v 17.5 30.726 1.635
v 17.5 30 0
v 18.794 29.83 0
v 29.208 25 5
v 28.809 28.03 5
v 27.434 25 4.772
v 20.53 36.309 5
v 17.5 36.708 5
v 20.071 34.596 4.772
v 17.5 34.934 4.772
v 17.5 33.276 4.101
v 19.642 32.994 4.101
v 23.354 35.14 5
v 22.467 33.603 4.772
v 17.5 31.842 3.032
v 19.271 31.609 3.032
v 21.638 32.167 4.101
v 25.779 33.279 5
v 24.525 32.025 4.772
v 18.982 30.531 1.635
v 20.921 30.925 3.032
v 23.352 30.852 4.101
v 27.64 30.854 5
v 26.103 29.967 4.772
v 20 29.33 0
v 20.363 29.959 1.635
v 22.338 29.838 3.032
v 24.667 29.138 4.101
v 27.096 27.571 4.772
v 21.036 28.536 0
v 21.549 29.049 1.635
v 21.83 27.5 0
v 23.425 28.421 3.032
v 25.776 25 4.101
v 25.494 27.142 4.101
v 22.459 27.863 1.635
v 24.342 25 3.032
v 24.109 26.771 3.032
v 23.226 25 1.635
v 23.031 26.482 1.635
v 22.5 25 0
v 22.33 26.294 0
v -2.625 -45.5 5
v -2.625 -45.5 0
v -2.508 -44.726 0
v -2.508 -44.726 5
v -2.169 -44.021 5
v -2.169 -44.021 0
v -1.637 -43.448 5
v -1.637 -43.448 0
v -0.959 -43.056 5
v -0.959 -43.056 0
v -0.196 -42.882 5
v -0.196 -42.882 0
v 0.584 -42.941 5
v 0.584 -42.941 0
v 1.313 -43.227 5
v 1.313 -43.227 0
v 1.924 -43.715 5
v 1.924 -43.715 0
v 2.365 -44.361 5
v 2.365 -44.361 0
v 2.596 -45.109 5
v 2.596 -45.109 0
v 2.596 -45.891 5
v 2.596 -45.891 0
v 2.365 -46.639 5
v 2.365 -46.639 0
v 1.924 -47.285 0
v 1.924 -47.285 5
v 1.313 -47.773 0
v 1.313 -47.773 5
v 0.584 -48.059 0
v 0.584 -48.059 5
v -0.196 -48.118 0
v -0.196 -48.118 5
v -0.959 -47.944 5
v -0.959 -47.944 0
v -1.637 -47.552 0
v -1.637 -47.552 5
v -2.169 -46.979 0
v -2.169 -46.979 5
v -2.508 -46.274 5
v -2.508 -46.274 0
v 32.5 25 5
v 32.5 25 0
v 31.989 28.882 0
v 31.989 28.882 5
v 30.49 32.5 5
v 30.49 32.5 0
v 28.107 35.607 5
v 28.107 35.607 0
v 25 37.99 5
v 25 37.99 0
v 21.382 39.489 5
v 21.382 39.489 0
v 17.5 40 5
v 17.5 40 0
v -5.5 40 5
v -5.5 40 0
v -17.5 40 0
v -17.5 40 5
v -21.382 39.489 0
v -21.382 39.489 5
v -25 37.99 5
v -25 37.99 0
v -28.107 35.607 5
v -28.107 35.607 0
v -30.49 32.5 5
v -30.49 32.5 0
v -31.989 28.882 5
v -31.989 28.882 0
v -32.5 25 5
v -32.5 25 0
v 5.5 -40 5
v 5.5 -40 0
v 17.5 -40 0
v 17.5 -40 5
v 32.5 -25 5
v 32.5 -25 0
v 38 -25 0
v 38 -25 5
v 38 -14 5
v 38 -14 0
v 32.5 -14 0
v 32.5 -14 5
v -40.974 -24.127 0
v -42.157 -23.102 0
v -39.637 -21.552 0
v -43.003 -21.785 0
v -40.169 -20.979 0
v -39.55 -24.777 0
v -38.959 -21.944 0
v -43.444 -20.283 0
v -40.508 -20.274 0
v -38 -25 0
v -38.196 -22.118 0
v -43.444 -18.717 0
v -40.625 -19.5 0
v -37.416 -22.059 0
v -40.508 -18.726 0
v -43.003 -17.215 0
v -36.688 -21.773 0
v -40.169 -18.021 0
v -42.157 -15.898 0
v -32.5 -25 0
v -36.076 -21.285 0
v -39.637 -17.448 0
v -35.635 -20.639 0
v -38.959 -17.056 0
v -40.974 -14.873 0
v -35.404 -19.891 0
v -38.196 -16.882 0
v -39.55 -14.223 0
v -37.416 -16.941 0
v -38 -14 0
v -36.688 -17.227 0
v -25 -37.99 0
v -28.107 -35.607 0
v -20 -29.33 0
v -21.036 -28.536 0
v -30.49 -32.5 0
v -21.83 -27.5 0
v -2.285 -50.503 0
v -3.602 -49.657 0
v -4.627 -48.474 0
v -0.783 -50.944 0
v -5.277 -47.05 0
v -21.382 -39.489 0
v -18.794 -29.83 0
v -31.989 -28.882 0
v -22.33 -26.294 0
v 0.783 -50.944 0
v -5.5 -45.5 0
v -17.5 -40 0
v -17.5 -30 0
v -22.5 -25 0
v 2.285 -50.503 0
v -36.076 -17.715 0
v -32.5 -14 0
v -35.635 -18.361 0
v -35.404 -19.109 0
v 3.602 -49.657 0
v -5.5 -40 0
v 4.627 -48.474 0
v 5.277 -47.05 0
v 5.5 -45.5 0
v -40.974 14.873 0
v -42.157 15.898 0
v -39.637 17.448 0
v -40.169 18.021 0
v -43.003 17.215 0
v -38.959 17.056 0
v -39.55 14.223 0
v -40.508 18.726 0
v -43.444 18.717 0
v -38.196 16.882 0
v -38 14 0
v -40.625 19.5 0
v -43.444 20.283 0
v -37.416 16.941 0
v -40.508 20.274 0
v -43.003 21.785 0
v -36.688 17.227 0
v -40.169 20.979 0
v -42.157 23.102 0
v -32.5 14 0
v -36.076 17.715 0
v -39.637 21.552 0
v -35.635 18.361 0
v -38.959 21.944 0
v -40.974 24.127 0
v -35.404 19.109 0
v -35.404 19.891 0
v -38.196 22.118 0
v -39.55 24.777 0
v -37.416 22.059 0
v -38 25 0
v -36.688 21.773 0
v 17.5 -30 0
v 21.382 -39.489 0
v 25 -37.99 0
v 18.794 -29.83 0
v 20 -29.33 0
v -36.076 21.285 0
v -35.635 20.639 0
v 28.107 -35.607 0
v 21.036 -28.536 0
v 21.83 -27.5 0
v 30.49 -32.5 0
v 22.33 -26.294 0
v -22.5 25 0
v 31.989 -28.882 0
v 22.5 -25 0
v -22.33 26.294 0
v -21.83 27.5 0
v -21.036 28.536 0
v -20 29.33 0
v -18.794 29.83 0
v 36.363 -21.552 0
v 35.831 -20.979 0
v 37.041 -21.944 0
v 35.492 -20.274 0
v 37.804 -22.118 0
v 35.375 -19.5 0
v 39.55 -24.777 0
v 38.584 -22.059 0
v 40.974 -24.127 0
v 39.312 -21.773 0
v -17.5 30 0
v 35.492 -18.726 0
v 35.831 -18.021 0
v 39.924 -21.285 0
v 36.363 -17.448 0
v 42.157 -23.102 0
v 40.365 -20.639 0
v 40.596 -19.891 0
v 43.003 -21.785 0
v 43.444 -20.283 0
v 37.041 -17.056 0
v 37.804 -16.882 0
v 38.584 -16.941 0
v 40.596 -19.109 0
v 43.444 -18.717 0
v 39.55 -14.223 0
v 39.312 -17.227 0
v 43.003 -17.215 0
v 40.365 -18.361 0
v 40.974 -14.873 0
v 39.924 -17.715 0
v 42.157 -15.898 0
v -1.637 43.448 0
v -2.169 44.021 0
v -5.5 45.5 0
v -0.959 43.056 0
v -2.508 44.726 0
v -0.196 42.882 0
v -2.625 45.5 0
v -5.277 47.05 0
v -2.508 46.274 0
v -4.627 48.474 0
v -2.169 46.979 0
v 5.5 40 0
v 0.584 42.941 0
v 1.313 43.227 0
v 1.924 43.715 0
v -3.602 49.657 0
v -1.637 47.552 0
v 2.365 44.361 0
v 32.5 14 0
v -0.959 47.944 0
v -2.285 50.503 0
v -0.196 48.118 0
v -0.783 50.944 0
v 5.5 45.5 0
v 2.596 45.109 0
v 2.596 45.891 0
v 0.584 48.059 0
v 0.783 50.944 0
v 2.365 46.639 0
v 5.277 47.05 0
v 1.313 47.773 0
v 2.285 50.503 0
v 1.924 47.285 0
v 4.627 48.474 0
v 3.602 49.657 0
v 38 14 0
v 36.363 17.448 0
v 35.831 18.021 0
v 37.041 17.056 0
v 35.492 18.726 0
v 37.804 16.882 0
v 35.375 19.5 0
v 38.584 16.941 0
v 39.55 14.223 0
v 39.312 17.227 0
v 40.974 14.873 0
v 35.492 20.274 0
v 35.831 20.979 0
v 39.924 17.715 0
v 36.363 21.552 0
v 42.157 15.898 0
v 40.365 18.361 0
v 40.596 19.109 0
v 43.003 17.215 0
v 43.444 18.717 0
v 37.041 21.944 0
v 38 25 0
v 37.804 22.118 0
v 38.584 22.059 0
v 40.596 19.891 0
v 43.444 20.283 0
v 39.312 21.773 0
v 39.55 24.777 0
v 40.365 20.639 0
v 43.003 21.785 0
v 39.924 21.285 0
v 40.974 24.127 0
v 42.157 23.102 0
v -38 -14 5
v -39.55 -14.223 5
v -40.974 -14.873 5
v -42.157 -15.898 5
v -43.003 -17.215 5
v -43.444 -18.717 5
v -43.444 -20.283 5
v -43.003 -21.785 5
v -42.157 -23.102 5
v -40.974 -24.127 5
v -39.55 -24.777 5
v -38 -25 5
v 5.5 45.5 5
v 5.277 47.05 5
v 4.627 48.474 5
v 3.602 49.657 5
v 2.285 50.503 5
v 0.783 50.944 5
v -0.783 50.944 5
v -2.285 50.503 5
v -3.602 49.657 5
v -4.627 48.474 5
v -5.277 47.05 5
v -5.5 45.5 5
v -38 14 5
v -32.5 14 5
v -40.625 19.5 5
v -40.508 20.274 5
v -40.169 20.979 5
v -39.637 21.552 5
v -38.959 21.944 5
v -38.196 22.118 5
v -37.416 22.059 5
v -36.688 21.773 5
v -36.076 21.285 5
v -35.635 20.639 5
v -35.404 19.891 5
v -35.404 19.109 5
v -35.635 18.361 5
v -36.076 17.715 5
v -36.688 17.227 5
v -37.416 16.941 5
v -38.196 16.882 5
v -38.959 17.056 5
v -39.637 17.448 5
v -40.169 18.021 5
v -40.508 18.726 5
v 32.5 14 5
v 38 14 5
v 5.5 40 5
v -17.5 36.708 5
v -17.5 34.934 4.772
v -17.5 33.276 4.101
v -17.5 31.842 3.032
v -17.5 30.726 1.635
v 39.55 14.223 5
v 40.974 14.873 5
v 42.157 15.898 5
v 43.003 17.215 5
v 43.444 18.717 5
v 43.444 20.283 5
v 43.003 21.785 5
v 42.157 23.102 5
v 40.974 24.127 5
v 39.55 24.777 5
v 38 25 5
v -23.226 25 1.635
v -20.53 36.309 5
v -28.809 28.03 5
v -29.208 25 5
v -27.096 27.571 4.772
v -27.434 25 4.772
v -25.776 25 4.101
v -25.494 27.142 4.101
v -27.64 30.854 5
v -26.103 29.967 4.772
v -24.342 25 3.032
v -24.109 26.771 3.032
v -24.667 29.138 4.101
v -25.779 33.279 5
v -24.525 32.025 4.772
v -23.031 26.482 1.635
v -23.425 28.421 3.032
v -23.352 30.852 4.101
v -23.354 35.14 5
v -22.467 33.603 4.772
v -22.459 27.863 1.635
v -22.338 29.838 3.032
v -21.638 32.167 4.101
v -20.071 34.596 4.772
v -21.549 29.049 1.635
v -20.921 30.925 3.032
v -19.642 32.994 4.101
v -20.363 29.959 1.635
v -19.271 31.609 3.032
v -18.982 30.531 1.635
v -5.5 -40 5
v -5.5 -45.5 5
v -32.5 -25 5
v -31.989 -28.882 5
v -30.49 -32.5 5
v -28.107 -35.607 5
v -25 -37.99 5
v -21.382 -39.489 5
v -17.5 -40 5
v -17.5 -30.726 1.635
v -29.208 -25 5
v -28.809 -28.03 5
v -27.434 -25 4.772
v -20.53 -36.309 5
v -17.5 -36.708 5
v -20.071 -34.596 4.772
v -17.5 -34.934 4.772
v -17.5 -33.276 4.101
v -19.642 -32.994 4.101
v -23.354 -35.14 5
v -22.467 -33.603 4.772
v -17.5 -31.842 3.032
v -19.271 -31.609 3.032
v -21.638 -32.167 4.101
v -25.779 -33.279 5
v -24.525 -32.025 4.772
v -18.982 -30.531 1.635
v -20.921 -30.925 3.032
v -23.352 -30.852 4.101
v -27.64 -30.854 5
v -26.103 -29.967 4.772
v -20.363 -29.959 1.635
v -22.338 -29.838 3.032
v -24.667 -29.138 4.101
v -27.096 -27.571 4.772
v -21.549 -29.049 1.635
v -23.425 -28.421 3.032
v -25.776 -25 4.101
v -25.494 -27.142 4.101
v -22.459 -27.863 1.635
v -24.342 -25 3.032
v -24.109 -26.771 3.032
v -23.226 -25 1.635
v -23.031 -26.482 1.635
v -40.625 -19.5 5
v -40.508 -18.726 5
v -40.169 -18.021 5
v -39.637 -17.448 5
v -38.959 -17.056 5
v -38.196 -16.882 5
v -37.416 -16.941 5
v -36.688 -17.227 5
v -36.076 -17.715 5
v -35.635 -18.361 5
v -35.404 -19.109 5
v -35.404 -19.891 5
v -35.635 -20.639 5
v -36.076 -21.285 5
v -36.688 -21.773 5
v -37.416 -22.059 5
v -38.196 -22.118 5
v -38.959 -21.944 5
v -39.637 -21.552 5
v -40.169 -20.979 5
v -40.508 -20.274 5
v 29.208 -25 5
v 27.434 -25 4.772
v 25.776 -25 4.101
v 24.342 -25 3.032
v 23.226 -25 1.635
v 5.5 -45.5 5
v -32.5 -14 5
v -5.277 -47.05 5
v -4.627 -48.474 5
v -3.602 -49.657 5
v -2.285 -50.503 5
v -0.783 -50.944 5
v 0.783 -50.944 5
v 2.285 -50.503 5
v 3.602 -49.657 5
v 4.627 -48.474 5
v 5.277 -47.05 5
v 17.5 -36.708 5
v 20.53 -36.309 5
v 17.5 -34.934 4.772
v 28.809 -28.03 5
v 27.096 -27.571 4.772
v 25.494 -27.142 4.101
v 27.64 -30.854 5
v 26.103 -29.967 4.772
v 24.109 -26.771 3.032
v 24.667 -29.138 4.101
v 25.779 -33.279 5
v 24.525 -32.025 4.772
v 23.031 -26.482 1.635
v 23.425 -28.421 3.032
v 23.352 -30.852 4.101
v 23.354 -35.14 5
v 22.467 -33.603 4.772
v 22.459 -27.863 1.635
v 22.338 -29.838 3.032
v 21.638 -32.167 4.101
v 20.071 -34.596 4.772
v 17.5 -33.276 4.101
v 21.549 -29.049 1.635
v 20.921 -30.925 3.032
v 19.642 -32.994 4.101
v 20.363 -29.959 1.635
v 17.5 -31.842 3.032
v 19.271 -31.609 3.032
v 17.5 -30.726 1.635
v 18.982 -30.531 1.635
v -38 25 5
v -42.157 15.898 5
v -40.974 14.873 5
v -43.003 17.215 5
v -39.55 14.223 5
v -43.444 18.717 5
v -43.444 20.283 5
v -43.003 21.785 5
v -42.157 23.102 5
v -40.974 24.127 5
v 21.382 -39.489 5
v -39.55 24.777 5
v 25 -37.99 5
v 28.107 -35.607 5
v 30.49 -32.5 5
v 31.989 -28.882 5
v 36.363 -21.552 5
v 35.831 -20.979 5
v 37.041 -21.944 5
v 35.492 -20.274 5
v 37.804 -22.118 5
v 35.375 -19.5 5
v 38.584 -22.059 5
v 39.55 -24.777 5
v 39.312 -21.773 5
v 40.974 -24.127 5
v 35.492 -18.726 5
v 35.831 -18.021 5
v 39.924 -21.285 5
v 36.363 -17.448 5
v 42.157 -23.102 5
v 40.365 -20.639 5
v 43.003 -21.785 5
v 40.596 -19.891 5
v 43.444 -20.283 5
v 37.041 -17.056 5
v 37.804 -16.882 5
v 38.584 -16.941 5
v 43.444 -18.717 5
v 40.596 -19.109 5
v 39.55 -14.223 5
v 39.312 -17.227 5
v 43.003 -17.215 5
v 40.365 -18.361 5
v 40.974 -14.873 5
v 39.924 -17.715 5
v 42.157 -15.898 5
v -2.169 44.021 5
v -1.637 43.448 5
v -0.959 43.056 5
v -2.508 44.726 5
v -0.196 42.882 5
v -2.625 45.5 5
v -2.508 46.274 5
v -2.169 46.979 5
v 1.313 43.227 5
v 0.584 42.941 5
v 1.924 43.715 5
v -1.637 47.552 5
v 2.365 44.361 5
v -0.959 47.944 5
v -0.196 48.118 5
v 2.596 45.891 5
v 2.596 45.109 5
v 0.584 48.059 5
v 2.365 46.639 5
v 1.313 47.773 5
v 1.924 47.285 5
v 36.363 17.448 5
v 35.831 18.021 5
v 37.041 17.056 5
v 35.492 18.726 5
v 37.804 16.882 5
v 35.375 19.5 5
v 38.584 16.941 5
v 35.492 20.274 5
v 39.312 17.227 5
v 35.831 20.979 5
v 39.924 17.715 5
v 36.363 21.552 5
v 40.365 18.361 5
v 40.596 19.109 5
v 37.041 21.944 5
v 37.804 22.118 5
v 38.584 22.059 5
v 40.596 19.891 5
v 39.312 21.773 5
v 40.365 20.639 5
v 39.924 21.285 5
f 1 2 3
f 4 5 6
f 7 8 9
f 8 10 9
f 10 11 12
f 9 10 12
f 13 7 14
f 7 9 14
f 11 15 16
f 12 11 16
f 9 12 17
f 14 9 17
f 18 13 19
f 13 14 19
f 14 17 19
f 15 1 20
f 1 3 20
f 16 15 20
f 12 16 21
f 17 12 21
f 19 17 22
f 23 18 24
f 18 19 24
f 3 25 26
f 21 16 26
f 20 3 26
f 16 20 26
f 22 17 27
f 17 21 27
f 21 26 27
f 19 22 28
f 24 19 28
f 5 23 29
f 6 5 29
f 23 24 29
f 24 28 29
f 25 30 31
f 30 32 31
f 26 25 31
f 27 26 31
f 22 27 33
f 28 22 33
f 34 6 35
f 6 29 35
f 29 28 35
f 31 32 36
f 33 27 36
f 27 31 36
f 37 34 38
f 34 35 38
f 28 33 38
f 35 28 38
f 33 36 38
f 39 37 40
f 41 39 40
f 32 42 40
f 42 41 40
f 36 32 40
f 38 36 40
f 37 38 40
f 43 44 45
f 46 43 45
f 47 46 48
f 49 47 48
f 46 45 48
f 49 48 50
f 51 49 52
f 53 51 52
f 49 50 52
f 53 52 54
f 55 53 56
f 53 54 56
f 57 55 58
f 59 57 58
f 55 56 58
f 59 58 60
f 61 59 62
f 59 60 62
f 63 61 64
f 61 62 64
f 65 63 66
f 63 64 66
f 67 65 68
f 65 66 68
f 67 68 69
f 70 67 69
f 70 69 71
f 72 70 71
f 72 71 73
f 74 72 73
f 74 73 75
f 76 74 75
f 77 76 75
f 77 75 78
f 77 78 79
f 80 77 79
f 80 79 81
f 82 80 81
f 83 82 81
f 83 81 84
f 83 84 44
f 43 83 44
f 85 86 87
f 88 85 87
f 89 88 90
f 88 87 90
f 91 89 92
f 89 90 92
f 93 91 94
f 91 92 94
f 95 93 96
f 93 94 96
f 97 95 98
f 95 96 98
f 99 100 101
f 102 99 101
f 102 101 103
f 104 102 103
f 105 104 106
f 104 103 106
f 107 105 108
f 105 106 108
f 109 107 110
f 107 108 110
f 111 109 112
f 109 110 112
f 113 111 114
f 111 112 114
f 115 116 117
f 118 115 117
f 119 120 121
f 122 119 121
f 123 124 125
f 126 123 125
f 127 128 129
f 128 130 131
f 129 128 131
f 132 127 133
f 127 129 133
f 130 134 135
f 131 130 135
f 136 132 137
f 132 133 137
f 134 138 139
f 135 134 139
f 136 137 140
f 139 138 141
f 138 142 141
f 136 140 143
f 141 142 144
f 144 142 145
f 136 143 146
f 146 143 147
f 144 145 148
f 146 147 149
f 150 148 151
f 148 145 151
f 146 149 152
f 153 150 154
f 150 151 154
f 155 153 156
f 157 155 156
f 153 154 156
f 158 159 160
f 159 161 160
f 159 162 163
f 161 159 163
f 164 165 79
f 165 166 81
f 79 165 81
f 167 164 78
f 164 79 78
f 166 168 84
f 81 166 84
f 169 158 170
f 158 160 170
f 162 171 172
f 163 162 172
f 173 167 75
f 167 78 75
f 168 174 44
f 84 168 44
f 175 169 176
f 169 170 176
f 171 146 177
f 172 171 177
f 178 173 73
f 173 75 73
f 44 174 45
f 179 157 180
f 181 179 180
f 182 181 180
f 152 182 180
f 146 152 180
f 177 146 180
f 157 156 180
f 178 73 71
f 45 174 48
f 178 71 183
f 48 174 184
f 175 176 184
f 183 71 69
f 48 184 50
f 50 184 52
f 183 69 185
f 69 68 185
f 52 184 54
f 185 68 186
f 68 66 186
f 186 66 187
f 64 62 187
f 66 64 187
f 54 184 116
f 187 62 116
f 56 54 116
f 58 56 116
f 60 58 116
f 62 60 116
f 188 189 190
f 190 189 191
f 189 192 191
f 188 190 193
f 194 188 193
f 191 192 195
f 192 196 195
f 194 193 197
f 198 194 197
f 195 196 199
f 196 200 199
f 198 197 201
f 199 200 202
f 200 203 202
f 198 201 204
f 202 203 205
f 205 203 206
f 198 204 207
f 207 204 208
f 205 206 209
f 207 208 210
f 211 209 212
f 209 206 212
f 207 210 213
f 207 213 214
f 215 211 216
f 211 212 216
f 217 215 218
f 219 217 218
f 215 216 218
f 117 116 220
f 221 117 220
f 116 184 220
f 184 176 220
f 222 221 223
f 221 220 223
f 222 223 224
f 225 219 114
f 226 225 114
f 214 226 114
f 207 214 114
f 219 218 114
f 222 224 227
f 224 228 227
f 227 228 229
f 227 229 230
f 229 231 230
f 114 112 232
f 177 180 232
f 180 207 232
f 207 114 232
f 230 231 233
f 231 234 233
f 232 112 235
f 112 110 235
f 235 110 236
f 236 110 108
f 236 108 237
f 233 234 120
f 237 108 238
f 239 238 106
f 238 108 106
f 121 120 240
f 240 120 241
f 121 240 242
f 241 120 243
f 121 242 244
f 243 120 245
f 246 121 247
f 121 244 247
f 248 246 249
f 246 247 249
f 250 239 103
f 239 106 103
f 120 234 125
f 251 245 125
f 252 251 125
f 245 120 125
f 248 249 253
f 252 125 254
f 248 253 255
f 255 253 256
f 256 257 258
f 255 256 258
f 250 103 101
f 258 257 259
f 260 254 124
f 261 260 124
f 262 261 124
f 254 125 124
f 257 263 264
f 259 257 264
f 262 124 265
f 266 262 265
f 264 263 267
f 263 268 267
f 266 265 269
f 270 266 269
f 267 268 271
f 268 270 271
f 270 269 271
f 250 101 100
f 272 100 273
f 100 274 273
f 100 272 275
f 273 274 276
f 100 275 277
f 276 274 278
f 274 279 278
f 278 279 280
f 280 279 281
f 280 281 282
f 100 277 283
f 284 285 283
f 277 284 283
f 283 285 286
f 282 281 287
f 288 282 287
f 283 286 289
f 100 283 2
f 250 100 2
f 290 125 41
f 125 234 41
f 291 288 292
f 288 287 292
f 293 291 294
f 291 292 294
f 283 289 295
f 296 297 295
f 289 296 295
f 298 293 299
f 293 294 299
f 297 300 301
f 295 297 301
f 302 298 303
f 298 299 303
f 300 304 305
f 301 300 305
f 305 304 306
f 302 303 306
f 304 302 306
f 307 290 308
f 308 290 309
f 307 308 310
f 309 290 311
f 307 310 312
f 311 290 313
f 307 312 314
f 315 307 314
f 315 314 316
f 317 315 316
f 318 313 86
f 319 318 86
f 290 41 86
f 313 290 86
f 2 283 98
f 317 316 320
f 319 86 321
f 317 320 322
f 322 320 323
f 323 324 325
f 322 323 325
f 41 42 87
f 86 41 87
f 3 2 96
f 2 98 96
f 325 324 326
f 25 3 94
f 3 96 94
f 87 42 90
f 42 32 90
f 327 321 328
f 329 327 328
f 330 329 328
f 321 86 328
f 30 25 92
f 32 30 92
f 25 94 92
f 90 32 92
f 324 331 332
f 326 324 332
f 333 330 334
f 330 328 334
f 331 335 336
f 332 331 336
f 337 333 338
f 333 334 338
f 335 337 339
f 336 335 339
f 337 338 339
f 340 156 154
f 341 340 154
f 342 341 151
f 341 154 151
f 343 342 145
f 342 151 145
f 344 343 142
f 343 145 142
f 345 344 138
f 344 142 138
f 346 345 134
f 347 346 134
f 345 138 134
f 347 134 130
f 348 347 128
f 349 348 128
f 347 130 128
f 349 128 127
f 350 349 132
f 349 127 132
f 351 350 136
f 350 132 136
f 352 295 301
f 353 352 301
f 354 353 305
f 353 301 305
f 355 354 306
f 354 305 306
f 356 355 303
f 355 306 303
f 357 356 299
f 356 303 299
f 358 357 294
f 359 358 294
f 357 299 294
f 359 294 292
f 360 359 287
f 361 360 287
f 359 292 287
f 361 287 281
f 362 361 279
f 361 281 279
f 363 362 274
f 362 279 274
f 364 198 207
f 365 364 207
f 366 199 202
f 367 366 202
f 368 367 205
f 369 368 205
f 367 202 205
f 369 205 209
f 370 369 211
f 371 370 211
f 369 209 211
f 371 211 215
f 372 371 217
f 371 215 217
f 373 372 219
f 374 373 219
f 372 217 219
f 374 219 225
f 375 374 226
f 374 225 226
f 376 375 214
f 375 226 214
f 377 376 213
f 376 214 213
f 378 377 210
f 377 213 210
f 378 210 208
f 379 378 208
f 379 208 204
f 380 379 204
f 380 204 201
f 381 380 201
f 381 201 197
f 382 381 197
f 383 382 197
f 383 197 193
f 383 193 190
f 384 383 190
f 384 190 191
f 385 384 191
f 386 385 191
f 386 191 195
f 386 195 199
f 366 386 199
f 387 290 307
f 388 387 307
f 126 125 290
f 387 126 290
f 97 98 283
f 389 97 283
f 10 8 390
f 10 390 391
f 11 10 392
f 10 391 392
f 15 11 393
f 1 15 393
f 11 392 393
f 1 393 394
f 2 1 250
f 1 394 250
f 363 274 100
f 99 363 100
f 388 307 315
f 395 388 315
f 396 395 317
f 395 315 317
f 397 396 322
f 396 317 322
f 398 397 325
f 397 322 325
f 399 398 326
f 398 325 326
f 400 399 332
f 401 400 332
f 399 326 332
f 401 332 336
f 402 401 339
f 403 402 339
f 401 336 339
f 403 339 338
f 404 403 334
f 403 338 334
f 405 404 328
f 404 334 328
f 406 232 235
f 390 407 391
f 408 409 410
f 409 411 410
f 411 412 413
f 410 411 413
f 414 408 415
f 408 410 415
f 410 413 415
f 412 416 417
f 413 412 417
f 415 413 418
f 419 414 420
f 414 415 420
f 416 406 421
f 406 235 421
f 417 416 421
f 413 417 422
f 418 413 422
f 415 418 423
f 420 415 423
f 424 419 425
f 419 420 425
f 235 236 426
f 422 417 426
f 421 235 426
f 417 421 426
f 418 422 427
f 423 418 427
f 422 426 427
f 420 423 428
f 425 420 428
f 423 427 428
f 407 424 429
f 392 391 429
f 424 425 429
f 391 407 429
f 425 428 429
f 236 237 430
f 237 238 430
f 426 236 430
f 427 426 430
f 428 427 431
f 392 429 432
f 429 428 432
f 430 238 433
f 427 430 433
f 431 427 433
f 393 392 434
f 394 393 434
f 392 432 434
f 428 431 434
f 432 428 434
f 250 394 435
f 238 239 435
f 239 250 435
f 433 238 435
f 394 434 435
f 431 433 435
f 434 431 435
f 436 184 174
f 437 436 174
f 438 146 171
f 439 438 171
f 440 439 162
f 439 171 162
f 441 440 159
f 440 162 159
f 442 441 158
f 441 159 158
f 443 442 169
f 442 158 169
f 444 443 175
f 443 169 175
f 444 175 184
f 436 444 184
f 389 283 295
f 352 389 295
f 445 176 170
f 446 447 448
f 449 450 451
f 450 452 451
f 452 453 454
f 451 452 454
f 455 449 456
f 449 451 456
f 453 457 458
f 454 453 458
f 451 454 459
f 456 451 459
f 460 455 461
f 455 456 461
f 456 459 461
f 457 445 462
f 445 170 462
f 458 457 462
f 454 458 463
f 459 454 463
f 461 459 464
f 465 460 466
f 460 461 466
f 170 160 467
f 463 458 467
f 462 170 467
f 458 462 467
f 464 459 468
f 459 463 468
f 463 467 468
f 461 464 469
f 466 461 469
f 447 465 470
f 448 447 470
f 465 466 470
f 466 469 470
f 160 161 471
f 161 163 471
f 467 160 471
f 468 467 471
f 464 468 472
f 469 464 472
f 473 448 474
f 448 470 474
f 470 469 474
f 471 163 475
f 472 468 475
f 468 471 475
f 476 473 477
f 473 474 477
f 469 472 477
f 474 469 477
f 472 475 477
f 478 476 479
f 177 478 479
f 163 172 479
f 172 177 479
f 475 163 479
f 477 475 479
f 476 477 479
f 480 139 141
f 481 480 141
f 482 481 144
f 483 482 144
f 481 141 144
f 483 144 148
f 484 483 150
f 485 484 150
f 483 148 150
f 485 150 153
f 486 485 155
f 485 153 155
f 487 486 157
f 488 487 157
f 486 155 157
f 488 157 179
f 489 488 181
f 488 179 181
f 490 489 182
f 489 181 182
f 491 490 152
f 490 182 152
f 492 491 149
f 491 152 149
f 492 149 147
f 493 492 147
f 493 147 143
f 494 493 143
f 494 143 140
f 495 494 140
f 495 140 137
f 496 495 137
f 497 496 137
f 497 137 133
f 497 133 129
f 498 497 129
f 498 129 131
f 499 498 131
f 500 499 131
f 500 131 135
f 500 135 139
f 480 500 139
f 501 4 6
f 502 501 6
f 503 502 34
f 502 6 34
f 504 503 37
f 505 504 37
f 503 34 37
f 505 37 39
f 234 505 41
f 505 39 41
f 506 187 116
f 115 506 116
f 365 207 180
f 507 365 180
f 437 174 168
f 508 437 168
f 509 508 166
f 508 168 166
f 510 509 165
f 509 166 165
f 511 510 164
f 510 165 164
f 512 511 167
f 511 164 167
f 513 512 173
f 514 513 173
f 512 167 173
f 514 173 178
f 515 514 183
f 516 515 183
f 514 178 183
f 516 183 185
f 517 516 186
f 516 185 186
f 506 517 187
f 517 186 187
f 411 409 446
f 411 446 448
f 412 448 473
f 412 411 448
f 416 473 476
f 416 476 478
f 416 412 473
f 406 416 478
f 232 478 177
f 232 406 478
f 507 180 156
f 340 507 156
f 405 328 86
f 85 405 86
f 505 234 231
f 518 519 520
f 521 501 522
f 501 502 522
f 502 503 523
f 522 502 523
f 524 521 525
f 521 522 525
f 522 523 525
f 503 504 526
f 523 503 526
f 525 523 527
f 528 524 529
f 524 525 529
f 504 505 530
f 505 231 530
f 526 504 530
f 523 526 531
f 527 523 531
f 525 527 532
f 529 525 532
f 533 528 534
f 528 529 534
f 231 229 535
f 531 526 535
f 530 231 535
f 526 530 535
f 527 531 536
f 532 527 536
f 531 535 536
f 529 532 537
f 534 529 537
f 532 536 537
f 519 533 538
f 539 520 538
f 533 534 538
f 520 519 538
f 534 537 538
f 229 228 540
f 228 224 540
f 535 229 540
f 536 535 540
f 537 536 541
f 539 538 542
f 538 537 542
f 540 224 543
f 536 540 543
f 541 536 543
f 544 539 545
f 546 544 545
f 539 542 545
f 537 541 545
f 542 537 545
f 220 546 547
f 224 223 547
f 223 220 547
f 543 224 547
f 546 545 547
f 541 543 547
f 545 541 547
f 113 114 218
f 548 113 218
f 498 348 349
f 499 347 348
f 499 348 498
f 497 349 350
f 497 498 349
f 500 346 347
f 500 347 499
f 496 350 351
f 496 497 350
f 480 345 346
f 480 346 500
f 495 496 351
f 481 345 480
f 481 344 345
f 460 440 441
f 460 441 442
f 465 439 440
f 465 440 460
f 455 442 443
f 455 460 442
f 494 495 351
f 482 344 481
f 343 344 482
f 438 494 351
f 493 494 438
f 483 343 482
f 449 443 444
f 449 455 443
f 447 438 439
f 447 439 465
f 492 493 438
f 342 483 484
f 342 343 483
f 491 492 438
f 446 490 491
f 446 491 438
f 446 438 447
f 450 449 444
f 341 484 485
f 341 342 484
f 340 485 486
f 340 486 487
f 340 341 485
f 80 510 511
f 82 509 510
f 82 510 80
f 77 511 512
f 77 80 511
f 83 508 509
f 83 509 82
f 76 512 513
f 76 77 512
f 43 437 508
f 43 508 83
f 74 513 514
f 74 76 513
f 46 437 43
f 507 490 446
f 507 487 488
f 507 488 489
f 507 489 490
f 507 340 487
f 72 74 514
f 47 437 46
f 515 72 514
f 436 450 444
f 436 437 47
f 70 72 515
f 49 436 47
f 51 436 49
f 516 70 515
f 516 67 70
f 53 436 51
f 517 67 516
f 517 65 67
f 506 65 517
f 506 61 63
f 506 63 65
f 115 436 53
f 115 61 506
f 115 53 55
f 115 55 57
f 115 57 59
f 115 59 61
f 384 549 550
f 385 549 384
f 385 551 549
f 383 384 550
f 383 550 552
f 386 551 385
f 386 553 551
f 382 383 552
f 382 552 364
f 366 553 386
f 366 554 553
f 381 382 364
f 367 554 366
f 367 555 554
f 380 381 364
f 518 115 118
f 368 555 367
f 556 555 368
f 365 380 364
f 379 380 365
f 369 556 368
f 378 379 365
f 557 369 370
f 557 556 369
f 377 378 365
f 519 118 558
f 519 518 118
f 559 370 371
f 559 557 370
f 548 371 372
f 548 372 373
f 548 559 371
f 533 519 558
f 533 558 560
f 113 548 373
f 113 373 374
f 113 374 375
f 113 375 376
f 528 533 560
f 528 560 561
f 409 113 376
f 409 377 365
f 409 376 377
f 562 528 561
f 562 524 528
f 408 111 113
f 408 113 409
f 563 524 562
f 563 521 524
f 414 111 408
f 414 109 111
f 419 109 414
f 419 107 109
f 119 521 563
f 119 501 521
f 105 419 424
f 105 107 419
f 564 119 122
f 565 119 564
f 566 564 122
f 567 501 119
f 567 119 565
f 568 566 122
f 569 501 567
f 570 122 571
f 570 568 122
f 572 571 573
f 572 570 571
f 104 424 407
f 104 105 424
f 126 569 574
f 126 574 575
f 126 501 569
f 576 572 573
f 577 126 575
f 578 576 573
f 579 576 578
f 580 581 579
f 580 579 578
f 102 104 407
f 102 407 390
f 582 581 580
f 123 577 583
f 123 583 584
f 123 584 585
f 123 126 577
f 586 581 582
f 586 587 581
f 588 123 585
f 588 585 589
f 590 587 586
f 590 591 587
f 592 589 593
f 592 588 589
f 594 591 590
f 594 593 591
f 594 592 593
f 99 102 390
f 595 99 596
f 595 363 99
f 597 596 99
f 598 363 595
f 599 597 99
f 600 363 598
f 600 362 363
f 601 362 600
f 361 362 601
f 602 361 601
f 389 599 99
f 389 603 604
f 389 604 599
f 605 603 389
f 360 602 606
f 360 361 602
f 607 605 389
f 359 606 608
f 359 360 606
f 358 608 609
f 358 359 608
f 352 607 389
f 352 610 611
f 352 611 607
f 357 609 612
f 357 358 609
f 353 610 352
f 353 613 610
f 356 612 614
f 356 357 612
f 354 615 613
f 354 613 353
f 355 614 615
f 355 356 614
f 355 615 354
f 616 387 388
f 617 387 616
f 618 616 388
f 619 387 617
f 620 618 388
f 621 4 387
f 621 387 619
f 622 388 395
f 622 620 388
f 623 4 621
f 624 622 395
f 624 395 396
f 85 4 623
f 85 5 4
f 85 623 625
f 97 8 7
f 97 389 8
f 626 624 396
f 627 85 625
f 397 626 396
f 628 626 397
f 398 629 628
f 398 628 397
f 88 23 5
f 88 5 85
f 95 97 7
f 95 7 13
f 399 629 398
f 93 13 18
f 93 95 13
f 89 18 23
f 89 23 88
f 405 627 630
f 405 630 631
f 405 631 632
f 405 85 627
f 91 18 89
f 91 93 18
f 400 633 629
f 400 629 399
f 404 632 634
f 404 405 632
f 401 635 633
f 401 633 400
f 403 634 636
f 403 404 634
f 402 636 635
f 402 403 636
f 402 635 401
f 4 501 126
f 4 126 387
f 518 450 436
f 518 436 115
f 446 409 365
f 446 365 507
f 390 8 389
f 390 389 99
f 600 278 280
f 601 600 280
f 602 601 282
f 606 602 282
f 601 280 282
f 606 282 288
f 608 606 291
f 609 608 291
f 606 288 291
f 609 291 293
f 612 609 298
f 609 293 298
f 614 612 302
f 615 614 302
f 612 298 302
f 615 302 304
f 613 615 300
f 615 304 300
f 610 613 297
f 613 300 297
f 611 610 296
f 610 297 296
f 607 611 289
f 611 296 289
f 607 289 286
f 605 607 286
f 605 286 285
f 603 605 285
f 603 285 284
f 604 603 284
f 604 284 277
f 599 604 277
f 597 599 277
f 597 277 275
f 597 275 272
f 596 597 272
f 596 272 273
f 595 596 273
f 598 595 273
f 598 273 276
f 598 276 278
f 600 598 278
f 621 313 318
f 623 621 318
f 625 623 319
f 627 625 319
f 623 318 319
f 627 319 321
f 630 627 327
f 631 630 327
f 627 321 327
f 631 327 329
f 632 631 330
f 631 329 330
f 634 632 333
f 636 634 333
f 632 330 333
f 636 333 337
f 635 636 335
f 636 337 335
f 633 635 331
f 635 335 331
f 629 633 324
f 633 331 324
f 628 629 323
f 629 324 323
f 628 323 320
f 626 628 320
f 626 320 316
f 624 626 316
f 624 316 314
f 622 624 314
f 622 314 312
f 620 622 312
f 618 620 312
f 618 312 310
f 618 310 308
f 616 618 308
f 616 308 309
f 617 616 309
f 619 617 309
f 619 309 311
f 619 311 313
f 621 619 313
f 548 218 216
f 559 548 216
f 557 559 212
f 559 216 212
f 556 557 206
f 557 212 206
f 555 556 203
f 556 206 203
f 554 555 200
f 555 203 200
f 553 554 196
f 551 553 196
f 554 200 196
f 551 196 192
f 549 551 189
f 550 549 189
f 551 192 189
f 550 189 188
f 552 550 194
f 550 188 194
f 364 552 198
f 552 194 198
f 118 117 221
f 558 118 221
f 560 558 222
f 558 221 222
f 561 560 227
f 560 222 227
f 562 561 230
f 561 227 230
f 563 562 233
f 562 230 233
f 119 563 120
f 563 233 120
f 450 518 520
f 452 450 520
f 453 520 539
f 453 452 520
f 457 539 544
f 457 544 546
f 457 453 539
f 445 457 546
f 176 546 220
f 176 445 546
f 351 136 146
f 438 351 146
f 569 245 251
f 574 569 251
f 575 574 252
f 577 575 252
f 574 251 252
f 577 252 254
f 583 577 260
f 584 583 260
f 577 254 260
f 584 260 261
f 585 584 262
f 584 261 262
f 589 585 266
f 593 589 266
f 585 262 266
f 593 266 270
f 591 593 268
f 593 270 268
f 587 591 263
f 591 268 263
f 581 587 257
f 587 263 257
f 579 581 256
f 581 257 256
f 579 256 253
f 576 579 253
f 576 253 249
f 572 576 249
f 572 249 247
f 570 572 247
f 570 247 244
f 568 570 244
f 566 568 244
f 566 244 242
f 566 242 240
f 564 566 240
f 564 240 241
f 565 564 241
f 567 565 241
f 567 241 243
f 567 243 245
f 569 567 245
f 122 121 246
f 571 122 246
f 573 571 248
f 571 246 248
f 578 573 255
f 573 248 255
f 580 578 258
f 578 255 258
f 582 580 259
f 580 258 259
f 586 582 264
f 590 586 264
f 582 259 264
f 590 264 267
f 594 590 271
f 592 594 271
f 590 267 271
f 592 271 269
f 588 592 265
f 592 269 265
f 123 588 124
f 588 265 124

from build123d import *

# Parameters (mm, degrees)
F1_DEPTH     = 5
F3_D         = 5.25
F3_DEPTH     = 40
F3_TIP       = 1.5772591249
F4_T1_DEPTH  = 50
F4_T3_DEPTH  = 35
F4_T6_ANGLE  = 90
F4_T8_ANGLE  = 90
F4_T10_ANGLE = 90
F4_T12_ANGLE = 90


# Not quite as in the source:
# - a fillet or chamfer that OpenCascade refuses, or shapes differently, is made with other operations: its cross-section is extruded or revolved along the edge and cut away or added


with BuildPart() as f1:
    # F0 (on Top) → F1 (new body)
    with BuildSketch(Plane.XY):
        with BuildLine():
            Line((-38, -25), (-32.5, -25))
            ThreePointArc((-32.5, -25), (-28.1066017178, -35.6066017178), (-17.5, -40))
            Line((-17.5, -40), (-5.5, -40))
            Line((-5.5, -40), (-5.5, -45.5))
            ThreePointArc((-5.5, -45.5), (0, -51), (5.5, -45.5))
            Line((5.5, -45.5), (5.5, -40))
            Line((5.5, -40), (17.5, -40))
            ThreePointArc((17.5, -40), (28.1066017178, -35.6066017178), (32.5, -25))
            Line((32.5, -25), (38, -25))
            ThreePointArc((38, -25), (43.5, -19.5), (38, -14))
            Line((38, -14), (32.5, -14))
            Line((32.5, -14), (32.5, 14))
            Line((32.5, 14), (38, 14))
            ThreePointArc((38, 14), (43.5, 19.5), (38, 25))
            Line((38, 25), (32.5, 25))
            ThreePointArc((32.5, 25), (28.1066017178, 35.6066017178), (17.5, 40))
            Line((17.5, 40), (5.5, 40))
            Line((5.5, 40), (5.5, 45.5))
            ThreePointArc((5.5, 45.5), (0, 51), (-5.5, 45.5))
            Line((-5.5, 45.5), (-5.5, 40))
            Line((-5.5, 40), (-17.5, 40))
            ThreePointArc((-17.5, 40), (-28.1066017178, 35.6066017178), (-32.5, 25))
            Line((-32.5, 25), (-38, 25))
            ThreePointArc((-38, 25), (-43.5, 19.5), (-38, 14))
            Line((-38, 14), (-32.5, 14))
            Line((-32.5, 14), (-32.5, -14))
            Line((-32.5, -14), (-38, -14))
            ThreePointArc((-38, -14), (-43.5, -19.5), (-38, -25))
        make_face()
        with BuildLine():
            Line((17.5, -30), (-17.5, -30))
            ThreePointArc((-17.5, -30), (-21.0355339059, -28.5355339059), (-22.5, -25))
            Line((-22.5, -25), (-22.5, 25))
            ThreePointArc((-22.5, 25), (-21.0355339059, 28.5355339059), (-17.5, 30))
            Line((-17.5, 30), (17.5, 30))
            ThreePointArc((17.5, 30), (21.0355339059, 28.5355339059), (22.5, 25))
            Line((22.5, 25), (22.5, -25))
            ThreePointArc((22.5, -25), (21.0355339059, -28.5355339059), (17.5, -30))
        make_face(mode=Mode.SUBTRACT)
    extrude(amount=F1_DEPTH)

    # F3
    with Locations(Plane.XY.offset(5)):
        with Locations((-38, 19.5), (0, 45.5), (38, 19.5), (38, -19.5), (0, -45.5), (-38, -19.5)):
            Hole(F3_D / 2, depth=F3_DEPTH)
            with Locations((0, 0, -(F3_DEPTH + F3_TIP / 2))):  # 118° drill point
                Cone(0, F3_D / 2, F3_TIP, mode=Mode.SUBTRACT)

    # F4: fillet of radius 7 on 1 edges, made by hand

    # F4_s2 → F4_t1 (cut)
    with BuildSketch(Plane.XZ.offset(-25)):
        with BuildLine():
            ThreePointArc((-29.2082039325, 5), (-25.0249037998, 3.6124860802), (-22.5, 0))
            Line((-22.5, 0), (-22.5, 5))
            Line((-22.5, 5), (-29.2082039325, 5))
        make_face()
        with BuildLine():
            ThreePointArc((29.2082039325, 5), (25.0249037998, 3.6124860802), (22.5, 0))
            Line((22.5, 0), (22.5, 5))
            Line((22.5, 5), (29.2082039325, 5))
        make_face()
    extrude(amount=F4_T1_DEPTH, mode=Mode.SUBTRACT)

    # F4_s4 → F4_t3 (cut)
    with BuildSketch(Plane.YZ.offset(-17.5)):
        with BuildLine():
            ThreePointArc((36.7082039325, 5), (32.5249037998, 3.6124860802), (30, 0))
            Line((30, 0), (30, 5))
            Line((30, 5), (36.7082039325, 5))
        make_face()
        with BuildLine():
            ThreePointArc((-36.7082039325, 5), (-32.5249037998, 3.6124860802), (-30, 0))
            Line((-30, 0), (-30, 5))
            Line((-30, 5), (-36.7082039325, 5))
        make_face()
    extrude(amount=F4_T3_DEPTH, mode=Mode.SUBTRACT)

    # F4_s5 → F4_t6 (revolve, cut)
    with BuildSketch(Plane.YZ.offset(-17.5)):
        with BuildLine():
            ThreePointArc((-36.7082039325, 5), (-32.5249037998, 3.6124860802), (-30, 0))
            Line((-30, 0), (-30, 5))
            Line((-30, 5), (-36.7082039325, 5))
        make_face()
    revolve(axis=Axis((-17.5, -25, 5), (0, 0, -1)), revolution_arc=F4_T6_ANGLE, mode=Mode.SUBTRACT)

    # F4_s7 → F4_t8 (revolve, cut)
    with BuildSketch(Plane.XZ.offset(-25)):
        with BuildLine():
            ThreePointArc((-29.2082039325, 5), (-25.0249037998, 3.6124860802), (-22.5, 0))
            Line((-22.5, 0), (-22.5, 5))
            Line((-22.5, 5), (-29.2082039325, 5))
        make_face()
    revolve(axis=Axis((-17.5, 25, 5), (0, 0, -1)), revolution_arc=F4_T8_ANGLE, mode=Mode.SUBTRACT)

    # F4_s9 → F4_t10 (revolve, cut)
    with BuildSketch(Plane.YZ.offset(17.5)):
        with BuildLine():
            ThreePointArc((36.7082039325, 5), (32.5249037998, 3.6124860802), (30, 0))
            Line((30, 0), (30, 5))
            Line((30, 5), (36.7082039325, 5))
        make_face()
    revolve(axis=Axis((17.5, 25, 5), (0, 0, -1)), revolution_arc=F4_T10_ANGLE, mode=Mode.SUBTRACT)

    # F4_s11 → F4_t12 (revolve, cut)
    with BuildSketch(Plane.XZ.offset(25)):
        with BuildLine():
            ThreePointArc((29.2082039325, 5), (25.0249037998, 3.6124860802), (22.5, 0))
            Line((22.5, 0), (22.5, 5))
            Line((22.5, 5), (29.2082039325, 5))
        make_face()
    revolve(axis=Axis((17.5, -25, 5), (0, 0, -1)), revolution_arc=F4_T12_ANGLE, mode=Mode.SUBTRACT)


solid = f1.part
